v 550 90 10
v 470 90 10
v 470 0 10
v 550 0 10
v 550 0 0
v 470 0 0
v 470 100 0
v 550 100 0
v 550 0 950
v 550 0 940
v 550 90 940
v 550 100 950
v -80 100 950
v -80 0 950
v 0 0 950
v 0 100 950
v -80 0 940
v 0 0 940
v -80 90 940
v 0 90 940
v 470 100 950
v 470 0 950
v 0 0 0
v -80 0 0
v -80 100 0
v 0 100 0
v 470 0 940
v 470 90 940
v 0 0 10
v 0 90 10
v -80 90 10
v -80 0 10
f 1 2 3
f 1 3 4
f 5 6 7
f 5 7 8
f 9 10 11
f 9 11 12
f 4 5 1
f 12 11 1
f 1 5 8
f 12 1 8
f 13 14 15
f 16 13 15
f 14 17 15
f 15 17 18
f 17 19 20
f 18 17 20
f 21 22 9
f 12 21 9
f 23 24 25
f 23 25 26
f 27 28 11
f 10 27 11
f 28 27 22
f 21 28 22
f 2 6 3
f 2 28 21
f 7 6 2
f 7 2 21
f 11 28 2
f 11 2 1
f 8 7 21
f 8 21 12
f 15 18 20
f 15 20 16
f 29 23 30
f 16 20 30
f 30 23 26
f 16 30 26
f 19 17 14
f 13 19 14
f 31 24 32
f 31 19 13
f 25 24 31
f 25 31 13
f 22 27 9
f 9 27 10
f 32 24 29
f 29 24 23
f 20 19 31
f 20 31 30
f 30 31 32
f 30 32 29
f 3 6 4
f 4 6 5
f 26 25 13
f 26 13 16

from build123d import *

# Parameters (mm, degrees)
CROQUIS1_W                = 80
CROQUIS1_H                = 10
SALIENTE_EXTRUIR1_DEPTH   = 100
SALIENTE_EXTRUIR1_2_DEPTH = 100
SALIENTE_EXTRUIR1_3_DEPTH = 100
SALIENTE_EXTRUIR1_4_DEPTH = 100
CROQUIS2_W                = 80
CROQUIS2_H                = 10
SALIENTE_EXTRUIR2_DEPTH   = 930


with BuildPart() as part:
    # Croquis1 → Saliente-Extruir1 (new body)
    with BuildSketch(Plane(origin=(0, 0, 0), x_dir=(1, 0, 0), z_dir=(0, 1, 0))):
        with Locations((-40, -5)):
            Rectangle(CROQUIS1_W, CROQUIS1_H)
    extrude(amount=SALIENTE_EXTRUIR1_DEPTH)



with BuildPart() as body_2:
    # Croquis1 → Saliente-Extruir1 2 (new body)
    with BuildSketch(Plane(origin=(0, 0, 0), x_dir=(1, 0, 0), z_dir=(0, 1, 0))):
        with Locations((510, -5)):
            Rectangle(CROQUIS1_W, CROQUIS1_H)
    extrude(amount=SALIENTE_EXTRUIR1_2_DEPTH)


with BuildPart() as body_3:
    # Croquis1 → Saliente-Extruir1 3 (new body)
    with BuildSketch(Plane(origin=(0, 0, 0), x_dir=(1, 0, 0), z_dir=(0, 1, 0))):
        with Locations((510, -945)):
            Rectangle(CROQUIS1_W, CROQUIS1_H)
    extrude(amount=SALIENTE_EXTRUIR1_3_DEPTH)


with BuildPart() as body_4:
    # Croquis1 → Saliente-Extruir1 4 (new body)
    with BuildSketch(Plane(origin=(0, 0, 0), x_dir=(1, 0, 0), z_dir=(0, 1, 0))):
        with Locations((-40, -945)):
            Rectangle(CROQUIS1_W, CROQUIS1_H)
    extrude(amount=SALIENTE_EXTRUIR1_4_DEPTH)


with BuildPart() as part_1:
    add(part.part)

    add(body_2.part)  # Saliente-Extruir2 merges body 2

    add(body_3.part)  # Saliente-Extruir2 merges body 3

    add(body_4.part)  # Saliente-Extruir2 merges body 4
    # Croquis2 → Saliente-Extruir2 (add)
    with BuildSketch(Plane.XY.offset(10)):
        with Locations((-40, 95)):
            Rectangle(CROQUIS2_W, CROQUIS2_H)
        with Locations((510, 95)):
            Rectangle(CROQUIS2_W, CROQUIS2_H)
    extrude(amount=SALIENTE_EXTRUIR2_DEPTH)


solid = part_1.part
